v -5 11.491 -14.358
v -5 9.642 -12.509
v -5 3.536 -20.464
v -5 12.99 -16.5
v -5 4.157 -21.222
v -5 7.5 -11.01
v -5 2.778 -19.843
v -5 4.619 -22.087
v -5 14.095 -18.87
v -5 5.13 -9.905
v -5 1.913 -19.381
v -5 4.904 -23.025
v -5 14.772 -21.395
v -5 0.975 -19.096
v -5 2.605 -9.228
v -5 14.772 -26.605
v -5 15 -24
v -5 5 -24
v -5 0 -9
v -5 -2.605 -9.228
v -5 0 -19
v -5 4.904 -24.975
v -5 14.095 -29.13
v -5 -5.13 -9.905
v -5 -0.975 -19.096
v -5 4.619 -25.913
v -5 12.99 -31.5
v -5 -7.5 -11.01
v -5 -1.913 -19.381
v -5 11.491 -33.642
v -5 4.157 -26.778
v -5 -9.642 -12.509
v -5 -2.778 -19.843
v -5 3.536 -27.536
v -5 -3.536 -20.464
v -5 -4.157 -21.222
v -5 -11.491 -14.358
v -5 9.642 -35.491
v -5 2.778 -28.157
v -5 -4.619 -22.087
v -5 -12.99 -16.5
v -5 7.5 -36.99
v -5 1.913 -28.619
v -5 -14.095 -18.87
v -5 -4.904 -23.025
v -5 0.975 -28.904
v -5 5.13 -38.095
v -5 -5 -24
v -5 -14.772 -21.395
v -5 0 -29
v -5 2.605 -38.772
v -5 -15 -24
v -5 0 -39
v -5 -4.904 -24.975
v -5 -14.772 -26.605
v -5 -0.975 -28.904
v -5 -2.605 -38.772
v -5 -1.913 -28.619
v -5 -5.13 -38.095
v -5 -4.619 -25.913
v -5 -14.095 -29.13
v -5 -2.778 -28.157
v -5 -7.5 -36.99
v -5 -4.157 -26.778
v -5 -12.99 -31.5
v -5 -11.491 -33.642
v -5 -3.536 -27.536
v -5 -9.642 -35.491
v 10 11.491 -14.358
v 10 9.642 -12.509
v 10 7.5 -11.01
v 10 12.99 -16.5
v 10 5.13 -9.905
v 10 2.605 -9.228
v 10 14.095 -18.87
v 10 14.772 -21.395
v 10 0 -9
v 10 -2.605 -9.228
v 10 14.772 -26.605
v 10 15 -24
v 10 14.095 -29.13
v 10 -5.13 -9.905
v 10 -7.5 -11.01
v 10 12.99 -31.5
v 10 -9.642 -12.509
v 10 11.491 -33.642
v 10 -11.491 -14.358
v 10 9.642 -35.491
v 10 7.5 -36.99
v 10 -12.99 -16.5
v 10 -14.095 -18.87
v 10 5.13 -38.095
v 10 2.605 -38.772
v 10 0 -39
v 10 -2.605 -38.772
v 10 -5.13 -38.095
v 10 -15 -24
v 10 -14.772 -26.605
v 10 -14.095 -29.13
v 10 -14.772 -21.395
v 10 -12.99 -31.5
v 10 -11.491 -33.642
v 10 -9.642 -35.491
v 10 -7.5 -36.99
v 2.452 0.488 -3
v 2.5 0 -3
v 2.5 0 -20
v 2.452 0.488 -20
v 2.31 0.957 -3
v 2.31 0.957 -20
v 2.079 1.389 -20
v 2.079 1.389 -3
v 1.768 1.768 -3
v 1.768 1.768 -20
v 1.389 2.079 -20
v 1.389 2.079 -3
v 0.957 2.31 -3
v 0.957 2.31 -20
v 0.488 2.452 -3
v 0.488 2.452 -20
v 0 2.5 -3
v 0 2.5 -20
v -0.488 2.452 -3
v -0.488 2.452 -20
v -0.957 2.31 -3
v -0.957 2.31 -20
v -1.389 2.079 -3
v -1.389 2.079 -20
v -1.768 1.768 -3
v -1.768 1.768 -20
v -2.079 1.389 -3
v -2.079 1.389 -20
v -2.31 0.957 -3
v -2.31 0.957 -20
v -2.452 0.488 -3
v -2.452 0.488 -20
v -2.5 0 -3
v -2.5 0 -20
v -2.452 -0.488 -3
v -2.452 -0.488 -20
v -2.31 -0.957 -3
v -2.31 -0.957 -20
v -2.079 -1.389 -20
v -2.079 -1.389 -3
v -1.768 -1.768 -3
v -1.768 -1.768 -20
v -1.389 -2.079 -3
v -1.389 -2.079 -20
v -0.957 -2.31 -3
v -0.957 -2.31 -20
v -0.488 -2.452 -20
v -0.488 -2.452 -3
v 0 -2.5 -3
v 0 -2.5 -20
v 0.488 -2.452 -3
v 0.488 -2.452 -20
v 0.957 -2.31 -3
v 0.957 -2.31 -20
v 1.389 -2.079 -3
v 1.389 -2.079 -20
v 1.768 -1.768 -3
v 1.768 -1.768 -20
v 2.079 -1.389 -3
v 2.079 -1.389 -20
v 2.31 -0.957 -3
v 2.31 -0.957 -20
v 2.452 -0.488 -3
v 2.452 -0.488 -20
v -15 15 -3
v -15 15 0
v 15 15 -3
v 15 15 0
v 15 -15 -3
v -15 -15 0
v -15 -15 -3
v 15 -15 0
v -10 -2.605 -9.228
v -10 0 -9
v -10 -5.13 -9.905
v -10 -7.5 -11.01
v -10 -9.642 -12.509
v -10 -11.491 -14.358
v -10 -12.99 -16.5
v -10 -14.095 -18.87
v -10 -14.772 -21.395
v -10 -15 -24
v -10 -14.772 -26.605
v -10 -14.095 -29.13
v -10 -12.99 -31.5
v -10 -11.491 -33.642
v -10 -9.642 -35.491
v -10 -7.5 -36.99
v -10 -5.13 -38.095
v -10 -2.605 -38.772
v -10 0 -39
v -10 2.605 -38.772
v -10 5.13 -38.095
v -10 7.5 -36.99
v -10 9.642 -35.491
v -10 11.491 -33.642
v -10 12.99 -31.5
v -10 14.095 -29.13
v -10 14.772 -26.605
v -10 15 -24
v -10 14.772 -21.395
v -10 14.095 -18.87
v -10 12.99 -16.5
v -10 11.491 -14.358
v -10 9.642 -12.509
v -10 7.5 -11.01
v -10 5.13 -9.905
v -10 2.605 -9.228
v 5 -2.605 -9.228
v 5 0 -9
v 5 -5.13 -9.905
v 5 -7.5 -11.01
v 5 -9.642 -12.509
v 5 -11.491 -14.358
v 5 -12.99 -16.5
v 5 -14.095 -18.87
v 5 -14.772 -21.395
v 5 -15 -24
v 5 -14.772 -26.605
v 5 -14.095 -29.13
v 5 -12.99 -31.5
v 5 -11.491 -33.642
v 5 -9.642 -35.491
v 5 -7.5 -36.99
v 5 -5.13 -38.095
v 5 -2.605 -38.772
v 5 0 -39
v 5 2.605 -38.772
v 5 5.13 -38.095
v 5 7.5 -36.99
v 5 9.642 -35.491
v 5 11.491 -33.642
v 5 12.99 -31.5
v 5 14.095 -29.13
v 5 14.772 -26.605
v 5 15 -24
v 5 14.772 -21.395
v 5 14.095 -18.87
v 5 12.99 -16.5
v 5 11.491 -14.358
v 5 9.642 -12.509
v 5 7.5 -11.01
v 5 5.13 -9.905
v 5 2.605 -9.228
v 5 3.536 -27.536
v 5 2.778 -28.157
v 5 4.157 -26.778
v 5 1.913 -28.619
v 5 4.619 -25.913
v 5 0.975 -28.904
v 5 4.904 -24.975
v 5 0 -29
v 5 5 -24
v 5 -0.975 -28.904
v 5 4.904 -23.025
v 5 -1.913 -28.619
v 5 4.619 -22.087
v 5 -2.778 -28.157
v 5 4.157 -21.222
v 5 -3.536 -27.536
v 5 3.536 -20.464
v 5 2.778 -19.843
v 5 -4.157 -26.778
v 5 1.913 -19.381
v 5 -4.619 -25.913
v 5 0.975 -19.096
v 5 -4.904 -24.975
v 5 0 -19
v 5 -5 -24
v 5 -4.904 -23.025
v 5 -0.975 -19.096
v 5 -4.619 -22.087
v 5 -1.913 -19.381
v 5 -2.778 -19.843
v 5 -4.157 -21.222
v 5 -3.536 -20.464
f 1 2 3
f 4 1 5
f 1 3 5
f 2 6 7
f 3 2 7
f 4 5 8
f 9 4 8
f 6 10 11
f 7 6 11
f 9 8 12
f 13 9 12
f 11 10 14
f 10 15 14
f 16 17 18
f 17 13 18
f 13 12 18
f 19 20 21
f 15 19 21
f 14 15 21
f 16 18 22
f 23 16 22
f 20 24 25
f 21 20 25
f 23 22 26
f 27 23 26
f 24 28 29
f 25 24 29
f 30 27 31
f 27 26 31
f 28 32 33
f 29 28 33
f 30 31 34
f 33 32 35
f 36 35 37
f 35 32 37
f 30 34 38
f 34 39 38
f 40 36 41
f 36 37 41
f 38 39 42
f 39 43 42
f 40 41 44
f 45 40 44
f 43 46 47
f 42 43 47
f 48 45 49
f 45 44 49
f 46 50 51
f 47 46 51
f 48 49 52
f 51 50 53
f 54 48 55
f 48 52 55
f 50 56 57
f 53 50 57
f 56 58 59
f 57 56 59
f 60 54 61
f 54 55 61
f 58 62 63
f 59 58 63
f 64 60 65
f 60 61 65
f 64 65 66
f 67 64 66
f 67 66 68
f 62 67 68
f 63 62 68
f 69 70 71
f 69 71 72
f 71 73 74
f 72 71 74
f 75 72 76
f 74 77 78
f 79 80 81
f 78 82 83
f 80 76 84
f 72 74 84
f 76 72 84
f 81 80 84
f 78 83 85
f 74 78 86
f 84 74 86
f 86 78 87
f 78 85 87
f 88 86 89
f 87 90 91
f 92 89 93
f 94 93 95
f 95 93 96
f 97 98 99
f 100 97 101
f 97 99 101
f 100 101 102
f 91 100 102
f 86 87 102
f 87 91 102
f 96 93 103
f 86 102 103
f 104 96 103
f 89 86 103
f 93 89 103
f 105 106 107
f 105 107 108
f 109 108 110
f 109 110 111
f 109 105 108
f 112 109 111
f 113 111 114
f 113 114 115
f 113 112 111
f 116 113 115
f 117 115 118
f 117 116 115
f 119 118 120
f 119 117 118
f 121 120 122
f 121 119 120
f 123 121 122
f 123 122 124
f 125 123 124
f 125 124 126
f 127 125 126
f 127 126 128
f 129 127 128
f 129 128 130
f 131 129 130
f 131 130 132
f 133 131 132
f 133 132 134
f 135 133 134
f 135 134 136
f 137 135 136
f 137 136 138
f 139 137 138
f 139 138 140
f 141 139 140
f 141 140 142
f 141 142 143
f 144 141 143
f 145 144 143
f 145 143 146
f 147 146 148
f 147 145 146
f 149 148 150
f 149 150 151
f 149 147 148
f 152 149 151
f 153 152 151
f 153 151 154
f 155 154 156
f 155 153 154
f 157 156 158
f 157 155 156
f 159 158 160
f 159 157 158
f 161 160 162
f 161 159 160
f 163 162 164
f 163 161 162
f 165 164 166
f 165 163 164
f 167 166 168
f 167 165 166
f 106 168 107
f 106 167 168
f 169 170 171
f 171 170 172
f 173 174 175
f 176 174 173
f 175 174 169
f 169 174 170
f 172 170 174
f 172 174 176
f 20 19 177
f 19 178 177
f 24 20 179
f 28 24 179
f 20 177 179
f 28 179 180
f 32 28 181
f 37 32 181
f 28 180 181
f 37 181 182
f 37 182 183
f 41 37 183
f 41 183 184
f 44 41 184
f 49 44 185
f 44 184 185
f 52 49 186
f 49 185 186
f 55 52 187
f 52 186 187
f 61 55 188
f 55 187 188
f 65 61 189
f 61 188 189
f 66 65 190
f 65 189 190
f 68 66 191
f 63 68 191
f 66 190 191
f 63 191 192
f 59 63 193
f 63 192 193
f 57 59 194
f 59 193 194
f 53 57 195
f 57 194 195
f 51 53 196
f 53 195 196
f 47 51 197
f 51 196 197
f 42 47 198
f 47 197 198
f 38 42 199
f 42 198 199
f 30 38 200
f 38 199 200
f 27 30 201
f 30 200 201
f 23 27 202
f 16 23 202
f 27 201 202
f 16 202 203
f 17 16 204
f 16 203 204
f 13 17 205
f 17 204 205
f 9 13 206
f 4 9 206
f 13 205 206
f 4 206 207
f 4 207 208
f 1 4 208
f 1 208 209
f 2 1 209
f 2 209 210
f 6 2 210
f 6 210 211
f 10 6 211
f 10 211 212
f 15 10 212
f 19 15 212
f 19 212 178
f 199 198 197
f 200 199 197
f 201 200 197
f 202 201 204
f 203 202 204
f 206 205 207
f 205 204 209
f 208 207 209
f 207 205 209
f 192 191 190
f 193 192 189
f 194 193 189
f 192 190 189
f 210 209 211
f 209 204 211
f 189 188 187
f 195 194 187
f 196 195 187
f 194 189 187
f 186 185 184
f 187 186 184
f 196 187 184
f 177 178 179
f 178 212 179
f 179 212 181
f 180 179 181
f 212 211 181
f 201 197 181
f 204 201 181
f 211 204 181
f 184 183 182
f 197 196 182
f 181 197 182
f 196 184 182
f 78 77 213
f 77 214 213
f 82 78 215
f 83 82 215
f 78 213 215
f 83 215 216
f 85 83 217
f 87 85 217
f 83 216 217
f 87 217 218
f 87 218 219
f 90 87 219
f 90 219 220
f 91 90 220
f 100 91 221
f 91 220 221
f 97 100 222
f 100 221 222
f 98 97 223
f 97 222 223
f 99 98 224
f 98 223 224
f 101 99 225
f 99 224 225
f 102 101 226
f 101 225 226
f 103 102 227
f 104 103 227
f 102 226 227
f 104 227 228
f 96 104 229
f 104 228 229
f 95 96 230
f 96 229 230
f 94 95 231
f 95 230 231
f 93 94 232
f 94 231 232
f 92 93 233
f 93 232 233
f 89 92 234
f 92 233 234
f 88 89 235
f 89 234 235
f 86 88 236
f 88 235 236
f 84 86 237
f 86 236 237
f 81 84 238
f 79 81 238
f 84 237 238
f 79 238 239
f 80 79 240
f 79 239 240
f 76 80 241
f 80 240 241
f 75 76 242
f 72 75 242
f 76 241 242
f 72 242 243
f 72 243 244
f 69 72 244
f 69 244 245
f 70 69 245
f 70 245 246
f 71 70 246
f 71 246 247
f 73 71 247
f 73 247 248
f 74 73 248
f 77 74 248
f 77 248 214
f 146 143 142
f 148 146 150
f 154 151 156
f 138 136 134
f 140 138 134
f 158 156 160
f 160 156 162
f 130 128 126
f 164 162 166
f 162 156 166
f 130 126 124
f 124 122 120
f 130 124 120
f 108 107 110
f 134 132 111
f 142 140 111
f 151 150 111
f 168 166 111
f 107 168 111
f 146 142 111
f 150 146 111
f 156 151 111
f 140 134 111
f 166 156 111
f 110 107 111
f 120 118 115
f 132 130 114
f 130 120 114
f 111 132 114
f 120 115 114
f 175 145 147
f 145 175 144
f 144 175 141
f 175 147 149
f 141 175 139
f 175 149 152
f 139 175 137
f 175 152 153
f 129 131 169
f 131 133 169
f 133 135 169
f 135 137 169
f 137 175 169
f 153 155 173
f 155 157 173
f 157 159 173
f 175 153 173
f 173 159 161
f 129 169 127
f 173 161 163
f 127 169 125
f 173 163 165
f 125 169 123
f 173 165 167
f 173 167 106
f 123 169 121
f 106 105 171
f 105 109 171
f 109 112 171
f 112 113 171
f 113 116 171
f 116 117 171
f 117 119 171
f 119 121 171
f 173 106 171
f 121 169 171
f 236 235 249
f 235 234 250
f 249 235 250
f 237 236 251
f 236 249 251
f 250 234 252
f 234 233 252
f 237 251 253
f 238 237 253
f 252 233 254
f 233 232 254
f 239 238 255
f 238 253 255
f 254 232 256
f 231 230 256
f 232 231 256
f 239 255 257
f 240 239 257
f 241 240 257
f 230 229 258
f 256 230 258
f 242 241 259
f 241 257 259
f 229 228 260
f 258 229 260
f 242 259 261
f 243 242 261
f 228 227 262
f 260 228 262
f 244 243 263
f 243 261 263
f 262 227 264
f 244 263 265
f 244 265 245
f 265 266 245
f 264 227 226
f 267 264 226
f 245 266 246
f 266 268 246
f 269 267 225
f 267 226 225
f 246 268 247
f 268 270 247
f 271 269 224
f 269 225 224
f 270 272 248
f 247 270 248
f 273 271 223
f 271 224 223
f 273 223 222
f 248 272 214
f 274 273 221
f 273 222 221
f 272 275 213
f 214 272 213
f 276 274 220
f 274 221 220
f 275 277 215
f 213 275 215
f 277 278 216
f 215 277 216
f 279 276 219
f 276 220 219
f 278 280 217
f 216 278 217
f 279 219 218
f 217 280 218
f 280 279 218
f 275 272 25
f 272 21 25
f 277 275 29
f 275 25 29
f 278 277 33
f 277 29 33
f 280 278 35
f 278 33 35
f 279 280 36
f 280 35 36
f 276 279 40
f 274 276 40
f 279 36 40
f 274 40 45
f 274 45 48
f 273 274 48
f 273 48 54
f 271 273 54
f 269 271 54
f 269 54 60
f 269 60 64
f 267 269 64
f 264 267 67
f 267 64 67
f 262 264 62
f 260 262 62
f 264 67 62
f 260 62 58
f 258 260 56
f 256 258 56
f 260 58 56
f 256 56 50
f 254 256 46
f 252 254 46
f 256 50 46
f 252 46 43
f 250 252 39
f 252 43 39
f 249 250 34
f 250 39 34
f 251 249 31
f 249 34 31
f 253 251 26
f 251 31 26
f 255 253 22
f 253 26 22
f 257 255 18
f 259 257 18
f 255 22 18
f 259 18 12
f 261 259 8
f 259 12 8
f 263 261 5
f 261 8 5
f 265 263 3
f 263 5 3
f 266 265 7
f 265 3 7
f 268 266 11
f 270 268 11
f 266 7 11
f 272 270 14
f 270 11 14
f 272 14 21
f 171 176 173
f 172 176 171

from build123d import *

# Parameters (mm, degrees)
F0_W     = 30
F0_H     = 30
F0_R     = 2.5
F1_DEPTH = 3
F2_DEPTH = 20


with BuildPart() as f1:
    # F0 (on Top) → F1 (new body)
    with BuildSketch(Plane.XY):
        Rectangle(F0_W, F0_H)
        Circle(F0_R, mode=Mode.SUBTRACT)
        Circle(F0_R)
    extrude(amount=-F1_DEPTH)

    # F0 (on Top) → F2 (join)
    with BuildSketch(Plane.XY):
        Circle(F0_R)
    extrude(amount=-F2_DEPTH)


with BuildPart() as f4:
    # F3 (on Front) → F4 (revolve)
    with BuildSketch(Plane.XZ):
        Polygon((-10, -9), (-10, -24), (10, -24), (10, -9), (5, -9), (5, -19), (-5, -19), (-5, -9), align=None)
    revolve(axis=Axis((0, 0, -24), (1, 0, 0)))


solid = Compound([f1.part, f4.part])
